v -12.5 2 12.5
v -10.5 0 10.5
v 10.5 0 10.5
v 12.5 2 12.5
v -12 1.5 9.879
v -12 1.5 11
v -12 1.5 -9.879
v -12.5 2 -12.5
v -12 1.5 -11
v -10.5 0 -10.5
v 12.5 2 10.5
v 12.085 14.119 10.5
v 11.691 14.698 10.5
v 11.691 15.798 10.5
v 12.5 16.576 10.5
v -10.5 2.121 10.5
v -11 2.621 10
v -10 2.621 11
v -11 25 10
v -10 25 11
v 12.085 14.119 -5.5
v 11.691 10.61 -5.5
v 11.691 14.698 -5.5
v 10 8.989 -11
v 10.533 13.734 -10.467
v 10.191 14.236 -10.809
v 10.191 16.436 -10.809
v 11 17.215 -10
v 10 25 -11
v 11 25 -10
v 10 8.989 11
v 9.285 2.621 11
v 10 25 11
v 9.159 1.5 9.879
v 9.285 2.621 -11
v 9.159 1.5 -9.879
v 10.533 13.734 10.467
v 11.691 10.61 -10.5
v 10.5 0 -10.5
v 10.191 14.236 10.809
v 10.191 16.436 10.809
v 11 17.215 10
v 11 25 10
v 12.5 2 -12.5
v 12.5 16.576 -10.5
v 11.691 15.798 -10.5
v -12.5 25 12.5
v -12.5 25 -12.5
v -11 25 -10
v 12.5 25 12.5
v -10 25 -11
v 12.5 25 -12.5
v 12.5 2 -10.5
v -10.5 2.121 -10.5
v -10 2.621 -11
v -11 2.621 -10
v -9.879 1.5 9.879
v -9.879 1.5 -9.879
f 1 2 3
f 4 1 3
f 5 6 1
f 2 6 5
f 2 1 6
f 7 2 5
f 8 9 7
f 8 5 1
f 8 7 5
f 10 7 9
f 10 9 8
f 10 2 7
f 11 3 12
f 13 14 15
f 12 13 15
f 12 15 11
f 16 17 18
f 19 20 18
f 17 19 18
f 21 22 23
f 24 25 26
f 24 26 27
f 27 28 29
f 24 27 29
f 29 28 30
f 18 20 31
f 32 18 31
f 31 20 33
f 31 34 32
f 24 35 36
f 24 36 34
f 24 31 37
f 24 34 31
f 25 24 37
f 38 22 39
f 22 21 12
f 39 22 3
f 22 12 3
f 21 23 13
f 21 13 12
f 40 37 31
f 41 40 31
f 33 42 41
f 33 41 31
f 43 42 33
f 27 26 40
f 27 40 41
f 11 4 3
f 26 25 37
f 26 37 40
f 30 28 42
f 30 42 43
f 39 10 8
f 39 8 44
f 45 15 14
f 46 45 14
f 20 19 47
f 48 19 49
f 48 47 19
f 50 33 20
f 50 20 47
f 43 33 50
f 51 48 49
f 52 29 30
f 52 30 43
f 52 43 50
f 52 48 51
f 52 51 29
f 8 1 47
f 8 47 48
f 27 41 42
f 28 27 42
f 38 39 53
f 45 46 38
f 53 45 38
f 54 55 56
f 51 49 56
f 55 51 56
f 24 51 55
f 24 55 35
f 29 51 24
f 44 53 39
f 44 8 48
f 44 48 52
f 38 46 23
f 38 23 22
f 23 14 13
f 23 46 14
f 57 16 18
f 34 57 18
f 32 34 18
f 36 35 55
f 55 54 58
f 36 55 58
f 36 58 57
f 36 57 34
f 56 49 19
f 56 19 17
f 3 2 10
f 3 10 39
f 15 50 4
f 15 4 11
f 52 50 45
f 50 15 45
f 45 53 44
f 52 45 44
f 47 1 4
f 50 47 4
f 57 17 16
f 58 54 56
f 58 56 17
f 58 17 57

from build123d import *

# Parameters (mm, degrees)
SKIZZE1_W                       = 25
SKIZZE1_H                       = 25
AUFSATZ_LINEAR_AUSTRAGEN1_DEPTH = 25
FASE1_SIZE                      = 2
SCHNITT_LINEAR_START            = -2
SCHNITT_LINEAR_AUSTRAGEN1_DEPTH = 21
WANDUNG1_START                  = -11
WANDUNG1_DEPTH                  = 22
WANDUNG1_START_2                = -12
WANDUNG1_2_DEPTH                = 22
FASE2_SIZE                      = 1
SCHNITT_LINEAR_AUSTRAGEN2_DEPTH = 5


with BuildPart() as part:
    # Skizze1 → Aufsatz-Linear austragen1 (new body)
    with BuildSketch(Plane(origin=(0, 0, 0), x_dir=(1, 0, 0), z_dir=(0, 1, 0))):
        Rectangle(SKIZZE1_W, SKIZZE1_H)
    extrude(amount=AUFSATZ_LINEAR_AUSTRAGEN1_DEPTH)

    # Fase1
    fase1_edges = [part.edges().sort_by_distance(p)[0] for p in [
        (0, 0, 12.5),
        (-12.5, 0, 0),
        (0, 0, -12.5),
        (12.5, 0, 0),
    ]]
    chamfer(fase1_edges, length=FASE1_SIZE)

    # Skizze3 → Schnitt-Linear austragen1 (cut)
    with BuildSketch(Plane.XY.offset(12.5).offset(SCHNITT_LINEAR_START)):
        Polygon((11.691418824, 15.798054248), (11.691418824, 14.698054248), (12.085432918, 14.119124044), (10.5, 0), (12.5, 0), (12.5, 16.576443976), align=None)
    extrude(amount=-SCHNITT_LINEAR_AUSTRAGEN1_DEPTH, mode=Mode.SUBTRACT)

    # Wandung1: read off the stored shape, not the designer's step
    # Wandung1 outline → Wandung1 (cut)
    with BuildSketch(Plane.XY.offset(WANDUNG1_START)):
        Polygon((10.191418824, 14.236037823), (10.191418824, 16.4361557), (11, 17.214545429), (11, 25), (-11, 25), (-11, 2.621320344), (-9.878679656, 1.5), (9.159007508, 1.5), (10.532808529, 13.734429342), align=None)
    extrude(amount=WANDUNG1_DEPTH, mode=Mode.SUBTRACT)

    # Wandung1 2 outline → Wandung1 2 (add)
    with BuildSketch(Plane.YZ.offset(WANDUNG1_START_2)):
        Polygon((2.621320344, -11), (1.5, -9.878679656), (1.5, -11), align=None)
        Polygon((1.5, 9.878679656), (2.621320344, 11), (1.5, 11), align=None)
    extrude(amount=WANDUNG1_2_DEPTH)

    # Fase2
    fase2_edges = [part.edges().sort_by_distance(p)[0] for p in [
        (11, 21.107272714, 11),
        (-11, 13.810660172, 11),
        (-11, 13.810660172, -11),
        (11, 21.107272714, -11),
    ]]
    chamfer(fase2_edges, length=FASE2_SIZE)

    # Skizze4 → Schnitt-Linear austragen2 (cut)
    with BuildSketch(Plane.XY.offset(-10.5)):
        Polygon((11.691418824, 15.798054248), (11.691418824, 11.720195976), (11.691418824, 10.610218801), (10.5, 0), (12.5, 2), (12.5, 16.576443976), align=None)
    extrude(amount=SCHNITT_LINEAR_AUSTRAGEN2_DEPTH, mode=Mode.SUBTRACT)


solid = part.part
